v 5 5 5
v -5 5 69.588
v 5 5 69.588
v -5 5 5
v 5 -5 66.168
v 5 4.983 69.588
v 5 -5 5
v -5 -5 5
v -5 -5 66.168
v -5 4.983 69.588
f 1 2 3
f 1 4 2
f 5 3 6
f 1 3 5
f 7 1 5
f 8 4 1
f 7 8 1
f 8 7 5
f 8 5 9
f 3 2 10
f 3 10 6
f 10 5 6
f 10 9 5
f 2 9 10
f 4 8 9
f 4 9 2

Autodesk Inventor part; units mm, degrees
ref_plane "Start Plane" through (0, 0, 5) normal (0, 0, 1) x (1, 0, 0)
ref_plane "End Plane" through (0, 0, 69.5885) normal (0, 0, 1) x (1, 0, 0)
sketch "Sketch" plane through (0, 0, 0) normal (0, 0, 1) x (1, 0, 0)
  line L0 (5, -5) -> (-5, -5)
  line L1 (-5, -5) -> (-5, 5)
  line L2 (-5, 5) -> (5, 5)
  line L3 (5, 5) -> (5, -5)
  line L4 (-6, 0) -> (8, 0) construction
  line L5 (0, -30) -> (0, 40) construction
  line L6 (0, 54) -> (0, -44) construction
  line L7 (-9.2, 0) -> (13.2, 0) construction
  dimension "d0" = 10
  dimension "d1" = 10
  dimension "d4" = 5
  dimension "d5" = 5
extrude "Body" add sketch "Sketch" along normal up to surface (64.5885 mm away) from surface at 5
sketch "Sketch3" plane through (0, 0, 0) normal (0, 0, 1) x (1, 0, 0)
  line L0 (0, 0) -> (10, 0)
ref_plane "Work Plane3" through (0, 0, 0) normal (0, -1, 0) x (1, 0, 0)
sketch "Sketch4" plane through (0, 0, 0) normal (0, -1, 0) x (1, 0, 0)
  line L0 (-2, 5) -> (12, 5)
  line L1 (-2, 69.5885) -> (12, 69.5885)
  dimension "d9" = 64.5885
ref_plane "Work Plane4" through (7, 153.7024, 120.5399) normal (0, -0.3241, 0.946) x (1, 0, 0)
split "Split1" plane through (7, 153.7024, 120.5399) removes the side toward (0, -0.3241, 0.946)
ref_plane "Work Plane15" through (10.0028, -61.5702, 5) normal (0, 0, -1) x (-1, 0, 0)
split "Split12" plane through (10.0028, -61.5702, 5) removes the side toward (0, 0, -1)
equation "\"d0\" = G_W"
equation "\"d1\" = G_H"
equation "\"d4\" = 0.5 * d1"
equation "\"d5\" = 0.5 * d0"
equation "\"d2\" = G_L"
equation "\"G_W\" = 10"
equation "\"G_H\" = 10"
equation "\"G_L\" = d9"
equation "\"G_OFFSET_START\" = -5"
equation "\"G_OFFSET_END\" = -8.85593"
equation "\"d6\" = -G_OFFSET_START"
equation "\"d7\" = G_OFFSET_END + B_L"
equation "\"B_L\" = 78.44444"
properties part number "ISO 1035/2 - 10 x 10 - 64,59" material "Steel, Mild"
